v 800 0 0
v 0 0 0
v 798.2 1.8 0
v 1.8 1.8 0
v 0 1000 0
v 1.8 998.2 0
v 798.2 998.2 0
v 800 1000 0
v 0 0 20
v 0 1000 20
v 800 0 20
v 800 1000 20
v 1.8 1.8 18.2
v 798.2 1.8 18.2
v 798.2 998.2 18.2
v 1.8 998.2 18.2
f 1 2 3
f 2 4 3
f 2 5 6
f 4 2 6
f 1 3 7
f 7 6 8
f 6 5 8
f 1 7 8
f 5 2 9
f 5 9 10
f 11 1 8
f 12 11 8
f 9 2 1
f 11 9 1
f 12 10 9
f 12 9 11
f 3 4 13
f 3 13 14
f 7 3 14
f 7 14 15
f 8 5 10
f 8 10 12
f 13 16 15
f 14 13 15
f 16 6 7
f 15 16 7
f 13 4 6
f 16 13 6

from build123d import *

# Parameters (mm, degrees)
SKETCH_1_W      = 800
SKETCH_1_H      = 1000
EXTRUDE_1_DEPTH = 20
SHELL_1_T       = -1.8


with BuildPart() as part:
    # 草图1 → 凸台-拉伸1 (new body)
    with BuildSketch(Plane.XY):
        with Locations((400, 500)):
            Rectangle(SKETCH_1_W, SKETCH_1_H)
    extrude(amount=EXTRUDE_1_DEPTH)

    # 抽壳1
    shell_1_openings = [part.faces().sort_by_distance(p)[0] for p in [
        (400, 500, 0),
    ]]
    offset(amount=SHELL_1_T, openings=shell_1_openings, kind=Kind.INTERSECTION)


solid = part.part
